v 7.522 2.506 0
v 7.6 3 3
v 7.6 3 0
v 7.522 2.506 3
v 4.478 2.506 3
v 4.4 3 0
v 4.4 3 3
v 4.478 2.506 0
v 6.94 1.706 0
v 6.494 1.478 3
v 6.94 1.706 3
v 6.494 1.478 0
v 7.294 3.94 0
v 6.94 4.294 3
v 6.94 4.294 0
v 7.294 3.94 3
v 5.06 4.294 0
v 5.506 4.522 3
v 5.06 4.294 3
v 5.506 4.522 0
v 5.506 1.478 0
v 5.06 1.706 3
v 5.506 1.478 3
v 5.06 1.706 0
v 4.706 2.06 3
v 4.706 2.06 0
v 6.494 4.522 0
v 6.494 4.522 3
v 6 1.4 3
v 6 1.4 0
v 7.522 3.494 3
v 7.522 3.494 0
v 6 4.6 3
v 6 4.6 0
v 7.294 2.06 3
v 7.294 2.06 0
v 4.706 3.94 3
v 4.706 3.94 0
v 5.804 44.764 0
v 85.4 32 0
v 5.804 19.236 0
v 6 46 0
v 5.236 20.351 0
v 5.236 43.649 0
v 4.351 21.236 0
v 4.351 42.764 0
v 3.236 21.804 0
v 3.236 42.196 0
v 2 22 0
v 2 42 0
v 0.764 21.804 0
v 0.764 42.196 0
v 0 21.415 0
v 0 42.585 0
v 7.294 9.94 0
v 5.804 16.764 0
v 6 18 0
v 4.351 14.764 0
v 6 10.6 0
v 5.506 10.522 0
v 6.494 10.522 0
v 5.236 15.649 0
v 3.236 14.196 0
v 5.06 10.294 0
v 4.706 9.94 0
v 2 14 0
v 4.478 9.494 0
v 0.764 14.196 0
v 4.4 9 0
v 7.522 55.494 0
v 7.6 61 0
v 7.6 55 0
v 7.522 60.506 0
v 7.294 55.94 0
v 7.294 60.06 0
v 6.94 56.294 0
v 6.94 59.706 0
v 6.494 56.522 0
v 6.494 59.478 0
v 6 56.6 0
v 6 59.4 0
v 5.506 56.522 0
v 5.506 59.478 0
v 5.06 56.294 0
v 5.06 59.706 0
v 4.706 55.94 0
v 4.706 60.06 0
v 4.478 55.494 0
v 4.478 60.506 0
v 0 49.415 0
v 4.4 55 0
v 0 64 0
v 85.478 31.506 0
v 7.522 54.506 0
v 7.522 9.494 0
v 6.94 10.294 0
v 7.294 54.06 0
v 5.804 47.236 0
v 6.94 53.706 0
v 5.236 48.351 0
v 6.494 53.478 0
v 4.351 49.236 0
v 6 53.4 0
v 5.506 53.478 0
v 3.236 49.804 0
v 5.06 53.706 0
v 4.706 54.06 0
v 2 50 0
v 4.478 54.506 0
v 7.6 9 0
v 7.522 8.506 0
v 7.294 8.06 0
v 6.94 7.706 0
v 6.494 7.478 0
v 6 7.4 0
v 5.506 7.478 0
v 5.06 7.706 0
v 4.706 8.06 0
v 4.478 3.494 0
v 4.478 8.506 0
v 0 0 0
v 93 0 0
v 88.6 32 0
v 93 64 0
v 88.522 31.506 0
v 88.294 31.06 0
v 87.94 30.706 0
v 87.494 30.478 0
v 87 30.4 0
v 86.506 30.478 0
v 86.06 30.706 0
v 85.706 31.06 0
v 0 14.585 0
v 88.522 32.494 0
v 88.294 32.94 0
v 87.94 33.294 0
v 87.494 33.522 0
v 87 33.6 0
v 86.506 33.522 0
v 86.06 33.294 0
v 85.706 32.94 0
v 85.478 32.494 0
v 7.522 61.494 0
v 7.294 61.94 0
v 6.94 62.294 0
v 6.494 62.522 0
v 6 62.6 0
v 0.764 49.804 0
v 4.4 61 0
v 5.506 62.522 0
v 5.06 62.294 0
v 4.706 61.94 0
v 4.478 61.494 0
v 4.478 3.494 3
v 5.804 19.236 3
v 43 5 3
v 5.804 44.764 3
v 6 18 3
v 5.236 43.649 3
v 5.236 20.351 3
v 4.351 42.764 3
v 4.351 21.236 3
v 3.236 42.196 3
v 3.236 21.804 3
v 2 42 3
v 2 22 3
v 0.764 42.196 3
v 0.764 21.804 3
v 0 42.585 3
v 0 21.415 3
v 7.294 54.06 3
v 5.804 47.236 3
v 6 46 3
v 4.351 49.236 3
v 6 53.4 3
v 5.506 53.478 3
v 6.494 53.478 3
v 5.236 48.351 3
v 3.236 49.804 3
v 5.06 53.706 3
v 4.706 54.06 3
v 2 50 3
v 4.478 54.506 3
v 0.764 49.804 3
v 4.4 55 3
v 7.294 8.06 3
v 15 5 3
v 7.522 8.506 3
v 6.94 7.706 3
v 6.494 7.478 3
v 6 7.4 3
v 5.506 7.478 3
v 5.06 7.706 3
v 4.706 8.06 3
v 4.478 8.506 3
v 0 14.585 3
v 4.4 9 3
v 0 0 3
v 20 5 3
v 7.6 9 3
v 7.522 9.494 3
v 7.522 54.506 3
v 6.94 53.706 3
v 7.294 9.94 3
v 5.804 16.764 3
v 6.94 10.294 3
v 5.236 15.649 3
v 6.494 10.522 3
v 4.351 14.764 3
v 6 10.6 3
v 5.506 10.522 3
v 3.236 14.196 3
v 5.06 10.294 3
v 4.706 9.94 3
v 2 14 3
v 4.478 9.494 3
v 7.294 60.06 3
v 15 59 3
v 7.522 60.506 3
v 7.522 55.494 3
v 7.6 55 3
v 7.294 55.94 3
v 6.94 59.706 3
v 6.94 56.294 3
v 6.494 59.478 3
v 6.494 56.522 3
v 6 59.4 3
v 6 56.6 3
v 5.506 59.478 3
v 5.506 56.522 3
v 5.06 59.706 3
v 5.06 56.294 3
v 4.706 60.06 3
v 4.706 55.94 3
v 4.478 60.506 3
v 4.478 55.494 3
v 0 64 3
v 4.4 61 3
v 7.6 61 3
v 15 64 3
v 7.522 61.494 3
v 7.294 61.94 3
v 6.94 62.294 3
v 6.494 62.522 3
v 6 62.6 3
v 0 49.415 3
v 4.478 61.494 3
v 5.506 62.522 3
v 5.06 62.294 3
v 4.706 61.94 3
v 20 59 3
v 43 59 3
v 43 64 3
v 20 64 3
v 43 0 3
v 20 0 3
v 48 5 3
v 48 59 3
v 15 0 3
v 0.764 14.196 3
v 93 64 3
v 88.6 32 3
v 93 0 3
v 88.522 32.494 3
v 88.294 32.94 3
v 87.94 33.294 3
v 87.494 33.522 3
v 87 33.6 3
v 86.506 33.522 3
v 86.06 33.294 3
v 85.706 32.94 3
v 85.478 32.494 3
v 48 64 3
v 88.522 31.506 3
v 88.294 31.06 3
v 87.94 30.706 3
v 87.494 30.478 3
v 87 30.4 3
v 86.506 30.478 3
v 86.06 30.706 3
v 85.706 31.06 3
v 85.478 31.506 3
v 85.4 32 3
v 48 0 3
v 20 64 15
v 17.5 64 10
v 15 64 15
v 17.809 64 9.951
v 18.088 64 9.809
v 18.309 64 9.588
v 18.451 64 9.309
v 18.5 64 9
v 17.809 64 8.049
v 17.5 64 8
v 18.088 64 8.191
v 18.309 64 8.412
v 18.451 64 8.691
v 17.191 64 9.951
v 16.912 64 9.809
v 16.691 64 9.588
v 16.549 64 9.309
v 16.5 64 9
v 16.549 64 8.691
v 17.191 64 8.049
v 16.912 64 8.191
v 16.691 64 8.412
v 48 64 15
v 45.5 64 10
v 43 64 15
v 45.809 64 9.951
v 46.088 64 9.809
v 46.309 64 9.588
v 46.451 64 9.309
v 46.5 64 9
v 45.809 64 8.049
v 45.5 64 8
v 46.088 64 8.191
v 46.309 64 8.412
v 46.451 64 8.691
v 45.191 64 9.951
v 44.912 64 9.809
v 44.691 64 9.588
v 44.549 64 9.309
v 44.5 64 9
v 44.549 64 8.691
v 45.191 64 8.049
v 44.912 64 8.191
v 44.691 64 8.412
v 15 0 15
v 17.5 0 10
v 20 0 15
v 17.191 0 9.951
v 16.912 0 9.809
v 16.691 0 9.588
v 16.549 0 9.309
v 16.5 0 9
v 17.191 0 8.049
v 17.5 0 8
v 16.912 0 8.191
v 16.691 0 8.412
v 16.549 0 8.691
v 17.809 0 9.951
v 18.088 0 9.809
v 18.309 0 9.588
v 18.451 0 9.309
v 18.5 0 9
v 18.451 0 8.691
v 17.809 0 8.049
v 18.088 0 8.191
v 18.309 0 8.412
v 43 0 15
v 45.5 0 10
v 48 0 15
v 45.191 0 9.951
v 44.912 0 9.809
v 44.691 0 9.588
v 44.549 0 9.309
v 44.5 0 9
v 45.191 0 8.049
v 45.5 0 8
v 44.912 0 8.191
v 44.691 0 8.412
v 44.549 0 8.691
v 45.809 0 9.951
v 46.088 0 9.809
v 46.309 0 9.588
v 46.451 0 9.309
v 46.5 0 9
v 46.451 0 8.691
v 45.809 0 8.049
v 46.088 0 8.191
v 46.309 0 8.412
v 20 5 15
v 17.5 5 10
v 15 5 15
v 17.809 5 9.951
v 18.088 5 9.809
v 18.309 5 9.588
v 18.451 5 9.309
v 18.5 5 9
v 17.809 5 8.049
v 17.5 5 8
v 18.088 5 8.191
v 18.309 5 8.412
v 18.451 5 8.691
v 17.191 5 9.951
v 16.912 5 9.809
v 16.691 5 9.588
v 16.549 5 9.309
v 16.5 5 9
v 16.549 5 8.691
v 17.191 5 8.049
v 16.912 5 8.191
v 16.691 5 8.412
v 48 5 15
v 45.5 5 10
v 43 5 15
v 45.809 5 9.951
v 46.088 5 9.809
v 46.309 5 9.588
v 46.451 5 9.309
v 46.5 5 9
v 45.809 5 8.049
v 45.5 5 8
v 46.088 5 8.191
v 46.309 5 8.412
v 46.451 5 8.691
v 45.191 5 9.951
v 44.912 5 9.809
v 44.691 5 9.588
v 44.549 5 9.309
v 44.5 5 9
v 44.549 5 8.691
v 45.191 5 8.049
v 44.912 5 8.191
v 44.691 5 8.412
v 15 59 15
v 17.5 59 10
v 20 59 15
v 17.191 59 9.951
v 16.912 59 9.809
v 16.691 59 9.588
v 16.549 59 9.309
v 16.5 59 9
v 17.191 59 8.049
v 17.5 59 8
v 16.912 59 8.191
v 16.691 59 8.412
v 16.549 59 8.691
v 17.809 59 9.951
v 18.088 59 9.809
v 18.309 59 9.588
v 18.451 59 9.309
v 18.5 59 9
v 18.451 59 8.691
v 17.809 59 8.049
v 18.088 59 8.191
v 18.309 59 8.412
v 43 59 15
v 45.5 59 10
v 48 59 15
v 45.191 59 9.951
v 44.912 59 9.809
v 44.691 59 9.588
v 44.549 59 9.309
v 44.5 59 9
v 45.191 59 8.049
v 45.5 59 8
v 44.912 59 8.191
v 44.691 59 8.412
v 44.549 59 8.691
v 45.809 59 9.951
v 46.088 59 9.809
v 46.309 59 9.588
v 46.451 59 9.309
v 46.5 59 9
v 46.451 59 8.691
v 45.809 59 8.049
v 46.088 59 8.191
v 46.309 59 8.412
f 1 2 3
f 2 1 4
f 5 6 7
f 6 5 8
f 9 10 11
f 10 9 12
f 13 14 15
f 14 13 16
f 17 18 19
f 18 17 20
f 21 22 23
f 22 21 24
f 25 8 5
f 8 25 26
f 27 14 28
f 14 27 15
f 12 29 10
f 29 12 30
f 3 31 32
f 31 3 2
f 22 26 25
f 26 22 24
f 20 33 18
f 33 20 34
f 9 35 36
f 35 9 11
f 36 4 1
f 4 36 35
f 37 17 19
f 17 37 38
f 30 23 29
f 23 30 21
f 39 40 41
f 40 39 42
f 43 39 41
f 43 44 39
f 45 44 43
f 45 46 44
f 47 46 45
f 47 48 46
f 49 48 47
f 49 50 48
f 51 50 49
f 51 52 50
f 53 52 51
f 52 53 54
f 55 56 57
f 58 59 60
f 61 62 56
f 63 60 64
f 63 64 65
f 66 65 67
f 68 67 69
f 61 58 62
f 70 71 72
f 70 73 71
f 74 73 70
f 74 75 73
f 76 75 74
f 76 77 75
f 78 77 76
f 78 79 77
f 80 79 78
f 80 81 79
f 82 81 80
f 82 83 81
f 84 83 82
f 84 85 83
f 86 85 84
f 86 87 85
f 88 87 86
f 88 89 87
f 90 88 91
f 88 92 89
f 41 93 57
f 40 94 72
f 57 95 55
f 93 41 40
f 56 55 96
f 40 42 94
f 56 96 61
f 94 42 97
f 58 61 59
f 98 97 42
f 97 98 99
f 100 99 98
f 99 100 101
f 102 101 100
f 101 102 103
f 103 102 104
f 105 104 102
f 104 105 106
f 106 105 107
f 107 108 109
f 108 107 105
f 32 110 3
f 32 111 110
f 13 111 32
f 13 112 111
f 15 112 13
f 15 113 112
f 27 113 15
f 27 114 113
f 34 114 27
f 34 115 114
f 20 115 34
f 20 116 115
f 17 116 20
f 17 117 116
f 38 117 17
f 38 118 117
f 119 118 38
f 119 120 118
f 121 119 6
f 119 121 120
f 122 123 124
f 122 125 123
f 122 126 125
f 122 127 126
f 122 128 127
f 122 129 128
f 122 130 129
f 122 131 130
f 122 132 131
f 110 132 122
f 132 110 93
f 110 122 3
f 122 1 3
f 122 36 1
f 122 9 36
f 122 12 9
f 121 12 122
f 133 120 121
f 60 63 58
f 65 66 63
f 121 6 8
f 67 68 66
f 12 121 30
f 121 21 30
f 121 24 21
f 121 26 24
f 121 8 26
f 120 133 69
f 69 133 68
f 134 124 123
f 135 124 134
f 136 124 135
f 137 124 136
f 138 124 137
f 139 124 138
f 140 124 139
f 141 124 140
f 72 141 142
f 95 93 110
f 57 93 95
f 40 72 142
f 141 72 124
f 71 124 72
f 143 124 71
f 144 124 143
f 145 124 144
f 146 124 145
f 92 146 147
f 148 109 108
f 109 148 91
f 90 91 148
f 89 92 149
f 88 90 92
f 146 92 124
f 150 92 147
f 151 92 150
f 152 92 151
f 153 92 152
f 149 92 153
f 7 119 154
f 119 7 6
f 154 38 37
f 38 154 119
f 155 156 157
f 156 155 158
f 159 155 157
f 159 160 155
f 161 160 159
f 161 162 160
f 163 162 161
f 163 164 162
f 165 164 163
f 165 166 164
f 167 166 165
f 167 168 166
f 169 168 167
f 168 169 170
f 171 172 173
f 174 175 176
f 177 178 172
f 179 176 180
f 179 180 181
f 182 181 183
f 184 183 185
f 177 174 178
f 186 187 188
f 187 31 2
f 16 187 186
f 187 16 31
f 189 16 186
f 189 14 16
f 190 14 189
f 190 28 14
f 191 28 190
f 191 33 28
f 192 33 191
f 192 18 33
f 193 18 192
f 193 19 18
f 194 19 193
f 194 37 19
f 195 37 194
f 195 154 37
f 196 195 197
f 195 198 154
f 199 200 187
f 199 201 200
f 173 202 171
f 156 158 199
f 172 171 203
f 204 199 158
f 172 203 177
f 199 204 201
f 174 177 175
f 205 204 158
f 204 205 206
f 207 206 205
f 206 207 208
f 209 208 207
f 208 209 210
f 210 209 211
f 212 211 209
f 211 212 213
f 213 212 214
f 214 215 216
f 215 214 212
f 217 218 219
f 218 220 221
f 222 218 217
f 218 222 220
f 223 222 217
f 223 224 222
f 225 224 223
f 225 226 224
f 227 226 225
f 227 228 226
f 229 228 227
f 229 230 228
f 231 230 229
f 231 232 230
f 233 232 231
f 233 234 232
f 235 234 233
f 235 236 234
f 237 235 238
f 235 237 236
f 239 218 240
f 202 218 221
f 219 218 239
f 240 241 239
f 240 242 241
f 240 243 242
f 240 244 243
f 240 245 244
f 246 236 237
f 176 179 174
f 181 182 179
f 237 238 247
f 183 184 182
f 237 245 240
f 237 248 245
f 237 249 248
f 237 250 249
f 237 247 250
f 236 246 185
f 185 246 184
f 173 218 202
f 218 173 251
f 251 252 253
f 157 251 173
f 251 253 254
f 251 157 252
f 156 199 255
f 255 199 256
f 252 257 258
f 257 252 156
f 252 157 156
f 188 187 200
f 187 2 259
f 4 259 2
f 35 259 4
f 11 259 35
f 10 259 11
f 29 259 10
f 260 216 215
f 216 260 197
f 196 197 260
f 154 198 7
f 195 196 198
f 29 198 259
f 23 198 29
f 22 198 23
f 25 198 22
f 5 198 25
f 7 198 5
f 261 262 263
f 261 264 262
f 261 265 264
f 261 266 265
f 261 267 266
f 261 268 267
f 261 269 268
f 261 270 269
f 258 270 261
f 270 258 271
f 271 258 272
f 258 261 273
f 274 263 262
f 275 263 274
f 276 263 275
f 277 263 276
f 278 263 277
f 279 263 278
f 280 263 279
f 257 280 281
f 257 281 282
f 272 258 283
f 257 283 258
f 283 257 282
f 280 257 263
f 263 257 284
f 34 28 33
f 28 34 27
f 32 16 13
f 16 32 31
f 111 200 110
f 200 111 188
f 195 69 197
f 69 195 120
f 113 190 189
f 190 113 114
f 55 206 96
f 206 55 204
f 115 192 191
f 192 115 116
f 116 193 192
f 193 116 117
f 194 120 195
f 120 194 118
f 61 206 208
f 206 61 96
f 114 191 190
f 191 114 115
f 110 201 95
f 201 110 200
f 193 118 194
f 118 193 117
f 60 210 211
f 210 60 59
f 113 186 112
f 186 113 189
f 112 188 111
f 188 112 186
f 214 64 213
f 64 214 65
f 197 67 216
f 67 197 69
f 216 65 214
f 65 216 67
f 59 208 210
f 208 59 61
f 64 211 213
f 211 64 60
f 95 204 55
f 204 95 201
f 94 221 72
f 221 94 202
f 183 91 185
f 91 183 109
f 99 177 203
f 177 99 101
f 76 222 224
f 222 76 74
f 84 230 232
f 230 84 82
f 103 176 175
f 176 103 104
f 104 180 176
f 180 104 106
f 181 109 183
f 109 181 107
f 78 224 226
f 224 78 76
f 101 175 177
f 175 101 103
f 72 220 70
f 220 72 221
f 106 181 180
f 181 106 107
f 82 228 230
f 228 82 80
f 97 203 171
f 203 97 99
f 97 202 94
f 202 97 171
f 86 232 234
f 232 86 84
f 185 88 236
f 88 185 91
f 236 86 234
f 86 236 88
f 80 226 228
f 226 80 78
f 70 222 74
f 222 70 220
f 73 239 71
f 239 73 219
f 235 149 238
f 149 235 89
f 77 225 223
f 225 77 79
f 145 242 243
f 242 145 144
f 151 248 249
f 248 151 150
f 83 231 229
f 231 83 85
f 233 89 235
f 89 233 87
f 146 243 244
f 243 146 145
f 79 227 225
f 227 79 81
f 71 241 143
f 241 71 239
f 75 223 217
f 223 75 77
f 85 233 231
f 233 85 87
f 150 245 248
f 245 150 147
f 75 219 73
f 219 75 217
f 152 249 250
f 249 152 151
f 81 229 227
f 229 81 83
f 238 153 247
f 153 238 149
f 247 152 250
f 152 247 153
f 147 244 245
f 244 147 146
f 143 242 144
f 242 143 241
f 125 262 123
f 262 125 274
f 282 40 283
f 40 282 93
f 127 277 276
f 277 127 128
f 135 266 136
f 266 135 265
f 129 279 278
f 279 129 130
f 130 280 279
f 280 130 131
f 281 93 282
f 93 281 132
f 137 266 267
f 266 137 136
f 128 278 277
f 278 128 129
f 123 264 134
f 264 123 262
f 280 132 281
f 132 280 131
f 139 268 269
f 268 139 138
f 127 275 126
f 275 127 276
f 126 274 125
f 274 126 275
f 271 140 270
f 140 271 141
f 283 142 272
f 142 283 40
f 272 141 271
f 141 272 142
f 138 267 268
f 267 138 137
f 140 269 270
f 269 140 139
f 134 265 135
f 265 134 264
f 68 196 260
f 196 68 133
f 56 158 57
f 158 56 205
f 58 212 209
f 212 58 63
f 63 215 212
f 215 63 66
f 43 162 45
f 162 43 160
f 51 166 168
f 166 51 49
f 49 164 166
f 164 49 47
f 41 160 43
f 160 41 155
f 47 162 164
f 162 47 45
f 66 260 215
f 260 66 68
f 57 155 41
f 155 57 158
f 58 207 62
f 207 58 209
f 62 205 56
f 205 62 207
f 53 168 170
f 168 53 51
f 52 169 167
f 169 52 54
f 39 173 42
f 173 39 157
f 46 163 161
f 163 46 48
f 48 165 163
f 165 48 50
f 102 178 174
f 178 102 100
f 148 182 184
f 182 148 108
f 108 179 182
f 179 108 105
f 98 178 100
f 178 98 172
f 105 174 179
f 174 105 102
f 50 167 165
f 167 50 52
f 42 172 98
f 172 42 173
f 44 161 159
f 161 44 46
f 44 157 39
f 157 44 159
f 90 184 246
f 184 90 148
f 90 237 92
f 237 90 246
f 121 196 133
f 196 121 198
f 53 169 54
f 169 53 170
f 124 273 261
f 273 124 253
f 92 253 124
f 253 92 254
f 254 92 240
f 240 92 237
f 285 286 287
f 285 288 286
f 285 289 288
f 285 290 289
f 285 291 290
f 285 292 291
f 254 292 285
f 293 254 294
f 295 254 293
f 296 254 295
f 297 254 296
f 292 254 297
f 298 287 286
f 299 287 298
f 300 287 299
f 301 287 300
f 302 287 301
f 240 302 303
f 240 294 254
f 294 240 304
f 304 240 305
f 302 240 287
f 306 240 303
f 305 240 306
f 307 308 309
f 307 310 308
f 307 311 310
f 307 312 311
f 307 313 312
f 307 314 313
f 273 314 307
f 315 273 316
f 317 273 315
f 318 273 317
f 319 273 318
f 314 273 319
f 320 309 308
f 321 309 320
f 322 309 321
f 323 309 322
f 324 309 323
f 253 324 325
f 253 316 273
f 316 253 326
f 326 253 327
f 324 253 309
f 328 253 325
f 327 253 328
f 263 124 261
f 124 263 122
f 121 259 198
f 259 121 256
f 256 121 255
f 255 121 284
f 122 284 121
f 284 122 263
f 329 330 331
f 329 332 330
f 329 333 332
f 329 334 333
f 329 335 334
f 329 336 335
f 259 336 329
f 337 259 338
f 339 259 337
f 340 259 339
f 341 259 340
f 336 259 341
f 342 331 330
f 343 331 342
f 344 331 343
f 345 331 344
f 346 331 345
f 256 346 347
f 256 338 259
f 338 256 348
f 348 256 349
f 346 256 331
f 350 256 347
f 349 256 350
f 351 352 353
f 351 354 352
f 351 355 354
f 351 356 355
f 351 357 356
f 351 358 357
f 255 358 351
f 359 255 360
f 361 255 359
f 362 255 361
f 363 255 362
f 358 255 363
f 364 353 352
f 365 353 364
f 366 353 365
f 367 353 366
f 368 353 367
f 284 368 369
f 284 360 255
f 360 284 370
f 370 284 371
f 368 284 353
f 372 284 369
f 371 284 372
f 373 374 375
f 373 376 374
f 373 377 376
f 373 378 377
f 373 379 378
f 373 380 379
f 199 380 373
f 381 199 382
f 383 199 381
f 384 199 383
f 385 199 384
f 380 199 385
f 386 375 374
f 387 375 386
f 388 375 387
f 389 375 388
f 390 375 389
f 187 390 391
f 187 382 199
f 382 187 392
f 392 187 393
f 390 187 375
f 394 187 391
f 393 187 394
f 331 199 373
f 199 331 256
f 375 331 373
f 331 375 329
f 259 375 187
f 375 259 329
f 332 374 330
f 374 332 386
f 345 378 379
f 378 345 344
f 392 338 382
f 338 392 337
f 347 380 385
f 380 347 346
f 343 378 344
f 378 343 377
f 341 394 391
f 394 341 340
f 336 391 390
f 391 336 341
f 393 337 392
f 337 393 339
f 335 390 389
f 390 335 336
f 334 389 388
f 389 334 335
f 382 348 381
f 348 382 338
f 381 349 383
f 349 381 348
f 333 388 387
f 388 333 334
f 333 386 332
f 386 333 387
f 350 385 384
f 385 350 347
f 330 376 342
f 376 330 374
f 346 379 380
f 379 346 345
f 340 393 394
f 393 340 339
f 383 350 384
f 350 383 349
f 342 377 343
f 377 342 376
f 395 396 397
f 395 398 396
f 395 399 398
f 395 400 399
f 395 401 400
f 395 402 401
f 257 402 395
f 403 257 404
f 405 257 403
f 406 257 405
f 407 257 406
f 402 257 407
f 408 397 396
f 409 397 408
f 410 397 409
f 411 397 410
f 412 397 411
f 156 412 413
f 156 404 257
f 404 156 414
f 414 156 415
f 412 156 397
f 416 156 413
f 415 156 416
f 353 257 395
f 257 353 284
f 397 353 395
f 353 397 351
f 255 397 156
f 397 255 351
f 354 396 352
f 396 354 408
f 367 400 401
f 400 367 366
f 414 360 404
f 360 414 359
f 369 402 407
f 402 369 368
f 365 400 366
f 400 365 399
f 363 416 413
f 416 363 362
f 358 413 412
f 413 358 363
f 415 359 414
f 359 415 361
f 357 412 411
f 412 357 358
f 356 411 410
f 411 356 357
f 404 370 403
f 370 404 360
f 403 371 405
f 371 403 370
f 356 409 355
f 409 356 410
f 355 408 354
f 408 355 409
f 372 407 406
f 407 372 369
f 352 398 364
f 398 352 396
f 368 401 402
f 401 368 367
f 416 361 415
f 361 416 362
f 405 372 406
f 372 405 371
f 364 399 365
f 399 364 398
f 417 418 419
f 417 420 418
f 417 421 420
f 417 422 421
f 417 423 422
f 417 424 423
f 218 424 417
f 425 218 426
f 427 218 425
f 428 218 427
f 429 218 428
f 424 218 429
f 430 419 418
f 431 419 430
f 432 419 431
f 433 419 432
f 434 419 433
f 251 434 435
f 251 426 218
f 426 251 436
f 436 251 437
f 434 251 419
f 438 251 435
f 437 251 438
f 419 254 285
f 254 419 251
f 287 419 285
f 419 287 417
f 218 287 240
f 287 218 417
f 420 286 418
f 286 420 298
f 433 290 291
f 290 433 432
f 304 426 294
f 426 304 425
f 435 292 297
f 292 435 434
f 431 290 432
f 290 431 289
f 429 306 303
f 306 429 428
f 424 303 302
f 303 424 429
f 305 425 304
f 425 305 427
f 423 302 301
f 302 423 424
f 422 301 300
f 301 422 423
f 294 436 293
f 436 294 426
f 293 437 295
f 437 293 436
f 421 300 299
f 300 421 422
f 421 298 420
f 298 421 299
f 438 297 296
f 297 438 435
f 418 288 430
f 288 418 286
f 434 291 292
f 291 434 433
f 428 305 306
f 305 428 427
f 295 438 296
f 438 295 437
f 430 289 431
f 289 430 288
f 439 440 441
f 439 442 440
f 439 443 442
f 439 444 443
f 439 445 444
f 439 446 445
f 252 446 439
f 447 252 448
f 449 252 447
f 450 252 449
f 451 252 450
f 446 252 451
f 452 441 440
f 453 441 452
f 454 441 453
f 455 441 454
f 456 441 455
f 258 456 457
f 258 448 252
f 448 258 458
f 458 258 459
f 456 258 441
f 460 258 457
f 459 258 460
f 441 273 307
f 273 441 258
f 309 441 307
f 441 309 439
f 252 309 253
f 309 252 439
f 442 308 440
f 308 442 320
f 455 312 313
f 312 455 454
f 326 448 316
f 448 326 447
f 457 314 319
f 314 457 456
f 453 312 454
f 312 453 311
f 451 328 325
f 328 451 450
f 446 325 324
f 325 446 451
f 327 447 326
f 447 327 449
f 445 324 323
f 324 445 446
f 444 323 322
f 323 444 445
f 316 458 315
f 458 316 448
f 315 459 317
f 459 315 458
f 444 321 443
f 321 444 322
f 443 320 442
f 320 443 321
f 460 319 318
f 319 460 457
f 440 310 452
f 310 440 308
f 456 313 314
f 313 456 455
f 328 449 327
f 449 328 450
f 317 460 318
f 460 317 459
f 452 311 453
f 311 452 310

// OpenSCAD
// file: ../common.scad
module screw_hole(radius, h)
    linear_extrude(height=h)
    {
        circle(r=radius, $fn = 20);
    }
// main file
use <../common.scad>;

module servo_holder_block()
    linear_extrude(height=5)
    {
        square([12,5]);
    }

module servo_holder_with_hole()
    rotate([0,-90,0])
        difference()
        {
            servo_holder_block();
            translate([6,2.5,0])
                screw_hole(1,5);
         }

module servo_holder_pair()
    rotate([0,0,-90])
    {
        translate([0,0,3])
            servo_holder_with_hole();
        translate([0,28,3])
            servo_holder_with_hole();
    }

module chassis_base_holes()
{
    //screw holes
    translate([6, 3, 0])
        screw_hole(1.6,3);
    translate([6, 9, 0])
        screw_hole(1.6,3);
    translate([6, 55, 0])
        screw_hole(1.6,3);
    translate([6, 61, 0])
        screw_hole(1.6,3);
    translate([87,32,0])
            screw_hole(1.6,3);

    //wire holes
    translate([2, 18, 0])
        screw_hole(4,3);
    translate([2, 46, 0])
        screw_hole(4,3);
}

module chassis_base()
    difference()
    {
        linear_extrude(height = 3)
            square([93,64]);
        chassis_base_holes();
    }

translate([0,0,0])
    chassis_base();
translate([15,0,0])
    servo_holder_pair();
translate([15,59,0])
    servo_holder_pair();
